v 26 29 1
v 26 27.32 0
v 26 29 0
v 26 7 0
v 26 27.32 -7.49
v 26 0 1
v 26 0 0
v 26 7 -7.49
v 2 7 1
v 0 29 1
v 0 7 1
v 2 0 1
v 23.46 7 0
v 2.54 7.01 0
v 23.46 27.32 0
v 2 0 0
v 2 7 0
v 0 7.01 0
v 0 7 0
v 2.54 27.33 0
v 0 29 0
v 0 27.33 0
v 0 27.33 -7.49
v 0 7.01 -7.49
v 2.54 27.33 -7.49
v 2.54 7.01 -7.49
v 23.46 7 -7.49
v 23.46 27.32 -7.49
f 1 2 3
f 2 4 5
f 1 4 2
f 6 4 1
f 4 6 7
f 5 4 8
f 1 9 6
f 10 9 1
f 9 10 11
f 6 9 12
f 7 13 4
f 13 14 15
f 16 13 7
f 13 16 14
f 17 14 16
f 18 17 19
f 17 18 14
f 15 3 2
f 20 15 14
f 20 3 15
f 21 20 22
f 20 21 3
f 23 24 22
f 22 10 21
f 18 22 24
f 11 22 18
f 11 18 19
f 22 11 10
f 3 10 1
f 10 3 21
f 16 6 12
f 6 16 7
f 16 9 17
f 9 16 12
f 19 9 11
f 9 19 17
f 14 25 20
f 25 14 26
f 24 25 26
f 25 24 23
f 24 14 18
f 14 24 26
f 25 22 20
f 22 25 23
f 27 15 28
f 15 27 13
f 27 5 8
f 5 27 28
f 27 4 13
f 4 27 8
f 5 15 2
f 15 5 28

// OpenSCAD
// file: pins.scad
module pinsocket(count, RM=2.54)
{
    // Component-specific parameters
    socket_color = "black";
    socket_z = 7.5;

    pin_color = "lightgray";
    pin_radius = RM/4;
    pin_z = 2;


    // Solder pin
    // color(pin_color)
    // translate([RM/2, RM/2, -pin_z])
    // cylinder(
    //         r = pin_radius,
    //         h = pin_z + nothing
    //     );

    // Socket
    color(socket_color)
    translate([-RM/2, 0, 0])
    cube([RM, count*RM, socket_z]);
}


module pins(count, RM=2.54)
{
    pinsocket(count, RM);

    // TODO...
}
// file: config.scad
// Rendering: Level of detail
$fn = 80;

// Quickfix for rendering artifacts on overlaps
nothing = 0.01;

adapter_pcb_size_x = 26;
adapter_pcb_size_y = 29;
adapter_pcb_size_z = 1.0;

sensor_pcb_size_x = 20;
sensor_pcb_size_y = 20;
sensor_pcb_size_z = 1.0;
// main file
include <config.scad>;
use <pins.scad>;


module adapter(
            // PCB outline
            pcb_color = "darkblue",
            pcb_x = adapter_pcb_size_x,
            pcb_y = adapter_pcb_size_y,
            pcb_z = adapter_pcb_size_z,

            // Pin sockets left and right
            RM = 2.54,
            pins_inset_y = 7.0,
            pin_count = 8,

            // Bottom-left corner
            corner_x = 2.0,
            corner_y = 7.0,
        )
{
    difference()
    {
        // PCB
        color(pcb_color)
        cube([
            pcb_x,
            pcb_y,
            pcb_z
        ]);

        // Bottom-left corner
        translate([-nothing, -nothing, -nothing])
        cube([
            corner_x + nothing,
            corner_y + nothing,
            pcb_z + 2*nothing
        ]);
    }

    // Pins left
    translate([
        RM/2,
        pins_inset_y + nothing,
        nothing
    ])
    rotate([0, 180, 0])
    pinsocket(pin_count, RM=RM);

    // Pins right
    translate([
        pcb_x - RM/2,
        pins_inset_y,
        nothing
    ])
    rotate([0, 180, 0])
    pinsocket(pin_count, RM=RM);
}

adapter();
